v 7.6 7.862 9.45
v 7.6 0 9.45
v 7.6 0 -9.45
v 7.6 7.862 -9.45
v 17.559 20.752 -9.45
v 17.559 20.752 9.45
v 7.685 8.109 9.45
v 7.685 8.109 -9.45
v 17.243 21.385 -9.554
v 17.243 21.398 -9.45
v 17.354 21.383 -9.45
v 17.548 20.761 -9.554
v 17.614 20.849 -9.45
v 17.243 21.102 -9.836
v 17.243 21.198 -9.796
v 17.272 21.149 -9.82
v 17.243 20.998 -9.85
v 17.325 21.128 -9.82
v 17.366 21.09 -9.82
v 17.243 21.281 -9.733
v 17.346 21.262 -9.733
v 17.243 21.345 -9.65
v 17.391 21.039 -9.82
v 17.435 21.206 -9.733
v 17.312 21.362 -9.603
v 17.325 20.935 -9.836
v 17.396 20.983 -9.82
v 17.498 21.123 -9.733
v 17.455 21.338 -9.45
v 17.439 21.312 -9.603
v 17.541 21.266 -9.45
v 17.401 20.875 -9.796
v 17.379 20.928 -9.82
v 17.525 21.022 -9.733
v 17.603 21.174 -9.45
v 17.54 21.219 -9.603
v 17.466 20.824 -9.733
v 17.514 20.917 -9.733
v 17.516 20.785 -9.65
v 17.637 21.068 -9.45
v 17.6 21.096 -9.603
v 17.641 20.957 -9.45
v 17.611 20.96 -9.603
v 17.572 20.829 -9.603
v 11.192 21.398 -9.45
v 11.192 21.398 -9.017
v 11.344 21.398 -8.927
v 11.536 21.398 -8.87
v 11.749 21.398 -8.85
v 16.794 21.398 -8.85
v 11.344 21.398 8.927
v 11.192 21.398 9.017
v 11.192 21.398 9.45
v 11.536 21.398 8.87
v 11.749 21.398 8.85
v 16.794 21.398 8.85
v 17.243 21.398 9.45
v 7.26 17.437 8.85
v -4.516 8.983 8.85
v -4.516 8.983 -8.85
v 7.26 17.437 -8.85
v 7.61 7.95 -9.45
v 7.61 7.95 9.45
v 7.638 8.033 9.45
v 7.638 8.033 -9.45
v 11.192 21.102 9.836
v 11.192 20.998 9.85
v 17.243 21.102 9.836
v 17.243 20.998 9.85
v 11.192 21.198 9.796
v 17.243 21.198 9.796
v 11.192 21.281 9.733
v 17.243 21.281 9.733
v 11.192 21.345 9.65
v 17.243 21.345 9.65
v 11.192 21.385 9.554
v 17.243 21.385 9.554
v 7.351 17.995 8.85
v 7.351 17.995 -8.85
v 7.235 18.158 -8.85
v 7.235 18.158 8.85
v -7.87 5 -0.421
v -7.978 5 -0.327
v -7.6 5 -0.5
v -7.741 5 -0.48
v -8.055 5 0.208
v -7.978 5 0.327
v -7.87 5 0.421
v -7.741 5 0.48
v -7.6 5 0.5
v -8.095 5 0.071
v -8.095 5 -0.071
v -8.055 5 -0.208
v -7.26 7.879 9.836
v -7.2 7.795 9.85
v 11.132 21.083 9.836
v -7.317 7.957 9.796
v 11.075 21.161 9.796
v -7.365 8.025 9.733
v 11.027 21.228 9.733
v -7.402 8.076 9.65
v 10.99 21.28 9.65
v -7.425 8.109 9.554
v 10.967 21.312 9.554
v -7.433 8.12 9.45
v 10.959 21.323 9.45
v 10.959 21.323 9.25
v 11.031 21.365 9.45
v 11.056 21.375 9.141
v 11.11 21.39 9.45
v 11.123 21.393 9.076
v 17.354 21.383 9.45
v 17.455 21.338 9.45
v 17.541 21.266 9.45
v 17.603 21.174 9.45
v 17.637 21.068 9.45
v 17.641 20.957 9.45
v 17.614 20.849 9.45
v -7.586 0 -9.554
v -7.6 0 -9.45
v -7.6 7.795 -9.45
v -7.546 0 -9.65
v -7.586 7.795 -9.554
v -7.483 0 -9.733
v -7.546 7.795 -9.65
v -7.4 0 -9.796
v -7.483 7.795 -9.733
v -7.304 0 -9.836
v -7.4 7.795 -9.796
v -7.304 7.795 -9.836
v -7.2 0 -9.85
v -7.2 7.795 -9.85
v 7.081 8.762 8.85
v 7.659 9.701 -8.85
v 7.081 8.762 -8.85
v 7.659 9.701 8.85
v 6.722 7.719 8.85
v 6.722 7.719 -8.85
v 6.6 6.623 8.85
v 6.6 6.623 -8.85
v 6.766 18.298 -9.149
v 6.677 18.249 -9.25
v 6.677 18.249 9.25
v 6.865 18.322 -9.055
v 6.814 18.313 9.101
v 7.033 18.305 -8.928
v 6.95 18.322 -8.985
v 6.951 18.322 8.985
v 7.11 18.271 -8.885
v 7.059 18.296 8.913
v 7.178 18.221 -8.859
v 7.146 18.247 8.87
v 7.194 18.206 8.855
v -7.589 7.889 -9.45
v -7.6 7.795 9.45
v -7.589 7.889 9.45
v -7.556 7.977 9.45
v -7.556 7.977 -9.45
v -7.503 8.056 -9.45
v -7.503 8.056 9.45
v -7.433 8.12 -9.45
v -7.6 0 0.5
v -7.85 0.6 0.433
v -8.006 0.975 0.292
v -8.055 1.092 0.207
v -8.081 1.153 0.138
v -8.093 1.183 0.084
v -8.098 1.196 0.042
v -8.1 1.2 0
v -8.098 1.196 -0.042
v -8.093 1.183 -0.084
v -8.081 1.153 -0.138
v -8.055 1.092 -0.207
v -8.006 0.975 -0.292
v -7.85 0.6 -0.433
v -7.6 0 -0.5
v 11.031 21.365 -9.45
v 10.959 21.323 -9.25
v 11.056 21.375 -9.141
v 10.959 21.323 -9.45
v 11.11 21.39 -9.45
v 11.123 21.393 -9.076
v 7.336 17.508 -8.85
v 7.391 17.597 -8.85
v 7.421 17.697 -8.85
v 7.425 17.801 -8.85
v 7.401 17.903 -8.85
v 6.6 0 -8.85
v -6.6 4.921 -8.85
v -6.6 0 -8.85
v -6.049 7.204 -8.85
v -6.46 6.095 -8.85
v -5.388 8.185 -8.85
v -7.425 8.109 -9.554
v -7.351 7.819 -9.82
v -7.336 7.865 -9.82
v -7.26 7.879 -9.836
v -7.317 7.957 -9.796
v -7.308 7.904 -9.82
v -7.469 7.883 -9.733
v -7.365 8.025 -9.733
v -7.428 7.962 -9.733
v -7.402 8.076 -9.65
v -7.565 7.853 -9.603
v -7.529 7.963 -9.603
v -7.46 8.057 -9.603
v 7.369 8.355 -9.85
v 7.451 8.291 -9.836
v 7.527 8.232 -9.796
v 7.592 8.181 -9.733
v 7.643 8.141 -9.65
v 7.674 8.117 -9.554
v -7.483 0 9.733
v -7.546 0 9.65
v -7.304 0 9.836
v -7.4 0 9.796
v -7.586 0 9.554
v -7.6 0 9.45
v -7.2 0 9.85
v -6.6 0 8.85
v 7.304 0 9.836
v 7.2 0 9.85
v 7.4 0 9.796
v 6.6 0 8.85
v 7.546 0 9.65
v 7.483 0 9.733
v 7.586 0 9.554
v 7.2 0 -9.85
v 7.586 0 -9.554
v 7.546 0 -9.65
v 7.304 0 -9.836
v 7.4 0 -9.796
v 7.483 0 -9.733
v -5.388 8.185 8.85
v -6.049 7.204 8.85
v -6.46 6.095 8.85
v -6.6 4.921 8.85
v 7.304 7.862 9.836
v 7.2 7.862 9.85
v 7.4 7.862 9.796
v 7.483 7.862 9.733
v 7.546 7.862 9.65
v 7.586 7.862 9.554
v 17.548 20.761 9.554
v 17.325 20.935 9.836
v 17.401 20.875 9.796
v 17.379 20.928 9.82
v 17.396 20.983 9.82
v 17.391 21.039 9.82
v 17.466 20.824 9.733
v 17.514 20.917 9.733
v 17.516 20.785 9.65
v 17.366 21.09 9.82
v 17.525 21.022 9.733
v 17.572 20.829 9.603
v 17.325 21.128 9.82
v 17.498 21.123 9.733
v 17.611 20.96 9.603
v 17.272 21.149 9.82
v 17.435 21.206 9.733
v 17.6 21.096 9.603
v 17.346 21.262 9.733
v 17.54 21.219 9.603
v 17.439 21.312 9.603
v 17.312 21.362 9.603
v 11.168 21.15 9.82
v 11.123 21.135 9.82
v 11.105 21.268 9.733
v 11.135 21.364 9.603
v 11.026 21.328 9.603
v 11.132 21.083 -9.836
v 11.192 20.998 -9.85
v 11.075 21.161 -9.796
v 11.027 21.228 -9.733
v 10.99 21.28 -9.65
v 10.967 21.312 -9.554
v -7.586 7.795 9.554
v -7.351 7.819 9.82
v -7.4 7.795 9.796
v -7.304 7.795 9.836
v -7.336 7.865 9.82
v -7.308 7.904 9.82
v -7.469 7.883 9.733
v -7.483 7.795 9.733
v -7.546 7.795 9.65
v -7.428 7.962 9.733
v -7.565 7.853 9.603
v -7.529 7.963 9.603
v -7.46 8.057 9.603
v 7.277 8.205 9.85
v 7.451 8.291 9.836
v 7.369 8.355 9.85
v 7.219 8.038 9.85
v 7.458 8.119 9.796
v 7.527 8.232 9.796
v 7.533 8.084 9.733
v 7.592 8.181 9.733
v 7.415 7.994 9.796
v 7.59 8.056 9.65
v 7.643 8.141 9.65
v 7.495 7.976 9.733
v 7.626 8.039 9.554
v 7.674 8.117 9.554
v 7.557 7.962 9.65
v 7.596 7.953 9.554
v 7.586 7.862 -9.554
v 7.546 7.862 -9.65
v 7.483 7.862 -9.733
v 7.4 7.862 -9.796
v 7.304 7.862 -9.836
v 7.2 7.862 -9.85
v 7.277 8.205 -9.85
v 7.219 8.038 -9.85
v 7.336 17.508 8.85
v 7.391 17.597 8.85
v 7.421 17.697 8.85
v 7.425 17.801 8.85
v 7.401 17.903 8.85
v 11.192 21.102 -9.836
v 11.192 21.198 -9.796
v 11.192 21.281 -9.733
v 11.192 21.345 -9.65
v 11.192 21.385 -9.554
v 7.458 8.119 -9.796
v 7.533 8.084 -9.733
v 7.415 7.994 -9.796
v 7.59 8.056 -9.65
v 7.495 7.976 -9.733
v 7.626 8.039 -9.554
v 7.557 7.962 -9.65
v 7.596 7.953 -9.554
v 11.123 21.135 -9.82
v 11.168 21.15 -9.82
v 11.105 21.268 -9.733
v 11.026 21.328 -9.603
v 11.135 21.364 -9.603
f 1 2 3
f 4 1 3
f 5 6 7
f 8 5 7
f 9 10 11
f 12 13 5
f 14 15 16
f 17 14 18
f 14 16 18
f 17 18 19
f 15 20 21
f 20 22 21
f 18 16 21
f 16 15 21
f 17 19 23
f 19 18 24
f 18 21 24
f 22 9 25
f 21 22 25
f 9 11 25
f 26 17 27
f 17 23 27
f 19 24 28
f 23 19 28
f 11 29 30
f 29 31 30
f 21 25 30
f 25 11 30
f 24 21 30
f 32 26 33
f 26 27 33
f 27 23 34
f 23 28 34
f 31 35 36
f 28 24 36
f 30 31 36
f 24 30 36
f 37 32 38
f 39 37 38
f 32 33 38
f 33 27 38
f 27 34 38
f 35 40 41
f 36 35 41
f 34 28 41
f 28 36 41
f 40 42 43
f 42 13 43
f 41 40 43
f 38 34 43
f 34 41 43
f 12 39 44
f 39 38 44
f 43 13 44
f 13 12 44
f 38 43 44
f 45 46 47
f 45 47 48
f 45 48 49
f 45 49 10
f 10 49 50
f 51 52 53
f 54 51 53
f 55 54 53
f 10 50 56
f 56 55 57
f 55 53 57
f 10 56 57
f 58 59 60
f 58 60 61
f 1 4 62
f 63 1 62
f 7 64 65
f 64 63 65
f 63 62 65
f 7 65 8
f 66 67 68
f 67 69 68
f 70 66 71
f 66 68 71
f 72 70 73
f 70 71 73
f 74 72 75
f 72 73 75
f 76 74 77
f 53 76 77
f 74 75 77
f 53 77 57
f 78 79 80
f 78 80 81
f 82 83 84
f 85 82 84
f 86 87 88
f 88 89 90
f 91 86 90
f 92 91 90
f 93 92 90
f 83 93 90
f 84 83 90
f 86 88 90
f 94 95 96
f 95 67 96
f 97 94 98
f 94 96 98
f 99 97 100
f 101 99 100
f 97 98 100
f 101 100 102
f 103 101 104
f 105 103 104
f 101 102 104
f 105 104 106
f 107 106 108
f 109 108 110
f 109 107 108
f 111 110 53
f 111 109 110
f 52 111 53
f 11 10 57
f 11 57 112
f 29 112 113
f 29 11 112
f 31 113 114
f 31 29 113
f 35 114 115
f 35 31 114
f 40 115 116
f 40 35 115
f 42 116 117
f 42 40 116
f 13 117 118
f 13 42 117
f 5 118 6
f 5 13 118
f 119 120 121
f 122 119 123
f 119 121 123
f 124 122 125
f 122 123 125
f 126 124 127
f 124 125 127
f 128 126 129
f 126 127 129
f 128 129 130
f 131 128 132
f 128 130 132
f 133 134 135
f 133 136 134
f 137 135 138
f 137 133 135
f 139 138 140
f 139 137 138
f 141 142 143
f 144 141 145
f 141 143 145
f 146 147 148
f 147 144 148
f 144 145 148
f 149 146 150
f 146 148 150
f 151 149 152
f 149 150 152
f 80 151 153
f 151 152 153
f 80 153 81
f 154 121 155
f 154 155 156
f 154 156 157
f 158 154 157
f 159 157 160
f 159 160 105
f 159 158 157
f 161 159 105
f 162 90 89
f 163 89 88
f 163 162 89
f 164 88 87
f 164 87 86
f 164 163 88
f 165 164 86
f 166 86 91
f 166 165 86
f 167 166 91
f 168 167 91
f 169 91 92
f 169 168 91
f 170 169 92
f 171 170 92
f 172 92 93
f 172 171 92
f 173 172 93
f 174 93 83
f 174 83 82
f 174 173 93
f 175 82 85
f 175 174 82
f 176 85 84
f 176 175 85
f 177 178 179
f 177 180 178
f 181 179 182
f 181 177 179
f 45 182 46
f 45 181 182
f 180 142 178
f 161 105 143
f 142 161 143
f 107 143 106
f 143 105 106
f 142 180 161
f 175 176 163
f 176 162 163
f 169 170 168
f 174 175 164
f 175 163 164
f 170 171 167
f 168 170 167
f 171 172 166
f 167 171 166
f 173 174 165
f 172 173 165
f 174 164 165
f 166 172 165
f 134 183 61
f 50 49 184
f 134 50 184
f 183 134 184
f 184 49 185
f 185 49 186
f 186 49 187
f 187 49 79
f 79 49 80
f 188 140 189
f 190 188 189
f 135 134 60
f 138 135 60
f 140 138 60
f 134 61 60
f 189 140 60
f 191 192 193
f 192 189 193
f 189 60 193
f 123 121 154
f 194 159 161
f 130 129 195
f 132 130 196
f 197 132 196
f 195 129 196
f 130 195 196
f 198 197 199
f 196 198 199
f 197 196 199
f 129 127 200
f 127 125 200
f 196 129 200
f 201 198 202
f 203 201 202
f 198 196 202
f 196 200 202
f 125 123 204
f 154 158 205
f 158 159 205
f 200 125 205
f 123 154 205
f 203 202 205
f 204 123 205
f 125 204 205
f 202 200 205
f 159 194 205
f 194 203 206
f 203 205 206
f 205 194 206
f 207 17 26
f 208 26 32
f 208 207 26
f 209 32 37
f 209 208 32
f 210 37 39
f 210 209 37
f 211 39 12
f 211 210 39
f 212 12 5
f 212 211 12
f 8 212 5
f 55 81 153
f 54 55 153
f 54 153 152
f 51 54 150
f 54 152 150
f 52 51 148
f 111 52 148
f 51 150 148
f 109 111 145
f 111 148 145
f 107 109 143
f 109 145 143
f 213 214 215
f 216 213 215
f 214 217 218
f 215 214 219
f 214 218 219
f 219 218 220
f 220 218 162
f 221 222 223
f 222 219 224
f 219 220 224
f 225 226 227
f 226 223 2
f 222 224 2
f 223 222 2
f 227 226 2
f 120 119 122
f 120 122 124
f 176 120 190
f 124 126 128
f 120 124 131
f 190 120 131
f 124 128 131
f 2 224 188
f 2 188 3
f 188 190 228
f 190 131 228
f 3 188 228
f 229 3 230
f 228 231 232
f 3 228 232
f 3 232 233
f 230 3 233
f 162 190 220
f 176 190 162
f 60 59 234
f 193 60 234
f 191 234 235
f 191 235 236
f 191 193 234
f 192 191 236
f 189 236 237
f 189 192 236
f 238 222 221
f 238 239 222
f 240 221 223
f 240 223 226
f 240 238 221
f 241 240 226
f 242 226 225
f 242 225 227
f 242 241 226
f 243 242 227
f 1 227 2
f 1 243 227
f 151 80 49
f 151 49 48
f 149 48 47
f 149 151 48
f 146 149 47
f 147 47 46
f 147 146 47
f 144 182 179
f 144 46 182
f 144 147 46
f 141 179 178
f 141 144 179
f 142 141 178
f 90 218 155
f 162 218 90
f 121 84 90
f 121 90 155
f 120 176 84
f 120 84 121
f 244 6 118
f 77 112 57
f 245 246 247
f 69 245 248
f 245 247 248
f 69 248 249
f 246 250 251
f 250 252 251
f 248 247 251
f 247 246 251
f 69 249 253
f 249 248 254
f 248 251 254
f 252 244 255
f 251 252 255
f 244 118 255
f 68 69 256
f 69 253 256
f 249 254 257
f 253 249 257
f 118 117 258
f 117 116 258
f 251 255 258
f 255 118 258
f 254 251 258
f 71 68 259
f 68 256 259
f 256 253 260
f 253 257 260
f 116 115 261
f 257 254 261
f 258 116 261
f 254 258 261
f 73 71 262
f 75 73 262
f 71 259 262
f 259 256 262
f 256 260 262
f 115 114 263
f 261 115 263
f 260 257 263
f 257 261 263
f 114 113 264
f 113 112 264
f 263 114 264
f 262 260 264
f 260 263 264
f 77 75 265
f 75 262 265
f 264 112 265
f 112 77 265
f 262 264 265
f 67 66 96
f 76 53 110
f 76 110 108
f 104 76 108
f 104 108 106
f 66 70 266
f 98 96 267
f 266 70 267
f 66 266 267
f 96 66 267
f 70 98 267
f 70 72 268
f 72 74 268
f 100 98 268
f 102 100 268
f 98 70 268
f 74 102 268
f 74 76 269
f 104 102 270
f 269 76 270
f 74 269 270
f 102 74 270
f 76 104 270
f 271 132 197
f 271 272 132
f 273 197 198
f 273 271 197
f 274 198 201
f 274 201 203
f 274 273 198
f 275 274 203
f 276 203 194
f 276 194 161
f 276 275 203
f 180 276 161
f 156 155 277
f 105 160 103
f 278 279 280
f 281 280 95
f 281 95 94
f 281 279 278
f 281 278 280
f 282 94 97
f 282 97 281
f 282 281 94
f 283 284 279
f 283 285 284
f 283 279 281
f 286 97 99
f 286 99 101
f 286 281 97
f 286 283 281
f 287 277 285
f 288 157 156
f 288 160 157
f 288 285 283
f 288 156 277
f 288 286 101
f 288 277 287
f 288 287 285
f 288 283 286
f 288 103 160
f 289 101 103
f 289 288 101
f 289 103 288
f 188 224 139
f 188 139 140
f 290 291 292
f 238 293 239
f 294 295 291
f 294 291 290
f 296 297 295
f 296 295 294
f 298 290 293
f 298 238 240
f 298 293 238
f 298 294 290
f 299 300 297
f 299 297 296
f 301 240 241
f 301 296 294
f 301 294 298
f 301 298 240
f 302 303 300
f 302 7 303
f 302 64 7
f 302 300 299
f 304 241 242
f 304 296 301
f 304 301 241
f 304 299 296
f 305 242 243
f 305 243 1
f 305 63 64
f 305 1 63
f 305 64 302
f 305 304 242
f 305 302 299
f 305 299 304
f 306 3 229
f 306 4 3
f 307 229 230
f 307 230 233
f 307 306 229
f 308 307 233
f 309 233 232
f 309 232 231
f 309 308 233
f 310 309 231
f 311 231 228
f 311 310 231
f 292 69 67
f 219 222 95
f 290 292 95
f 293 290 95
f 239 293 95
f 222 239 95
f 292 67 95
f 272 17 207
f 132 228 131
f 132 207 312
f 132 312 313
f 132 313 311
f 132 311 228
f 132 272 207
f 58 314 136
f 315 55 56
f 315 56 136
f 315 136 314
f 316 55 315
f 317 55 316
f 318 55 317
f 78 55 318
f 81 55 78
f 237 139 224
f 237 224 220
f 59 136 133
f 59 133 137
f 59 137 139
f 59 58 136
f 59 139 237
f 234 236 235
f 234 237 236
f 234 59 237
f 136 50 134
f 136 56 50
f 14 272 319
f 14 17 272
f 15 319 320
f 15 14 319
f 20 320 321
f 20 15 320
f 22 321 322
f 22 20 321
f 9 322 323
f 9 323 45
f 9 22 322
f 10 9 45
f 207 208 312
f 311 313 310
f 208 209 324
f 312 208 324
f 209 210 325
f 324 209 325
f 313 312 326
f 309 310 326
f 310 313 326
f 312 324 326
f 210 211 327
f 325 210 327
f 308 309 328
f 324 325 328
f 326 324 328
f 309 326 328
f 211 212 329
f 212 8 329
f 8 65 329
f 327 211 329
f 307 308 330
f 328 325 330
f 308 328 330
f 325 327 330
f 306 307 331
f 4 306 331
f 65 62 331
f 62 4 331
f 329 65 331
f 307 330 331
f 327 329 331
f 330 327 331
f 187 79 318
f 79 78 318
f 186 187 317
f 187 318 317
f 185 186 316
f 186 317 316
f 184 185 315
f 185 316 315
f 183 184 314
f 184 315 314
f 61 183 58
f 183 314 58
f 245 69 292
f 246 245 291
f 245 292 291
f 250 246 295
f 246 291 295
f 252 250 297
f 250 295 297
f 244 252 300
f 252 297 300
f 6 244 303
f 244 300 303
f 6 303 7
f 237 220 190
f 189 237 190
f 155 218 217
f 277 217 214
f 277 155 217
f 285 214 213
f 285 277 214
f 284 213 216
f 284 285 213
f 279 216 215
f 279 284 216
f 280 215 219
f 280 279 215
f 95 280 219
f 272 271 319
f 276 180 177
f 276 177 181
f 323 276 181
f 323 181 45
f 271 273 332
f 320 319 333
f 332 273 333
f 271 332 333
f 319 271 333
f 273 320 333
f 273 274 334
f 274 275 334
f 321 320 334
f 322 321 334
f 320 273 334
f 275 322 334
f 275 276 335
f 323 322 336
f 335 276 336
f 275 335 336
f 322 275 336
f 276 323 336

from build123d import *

# Parameters (mm, degrees)
SKETCH1_W               = 15.2
SKETCH1_H               = 19.7
EXTRUDE1_DEPTH          = 8
BOSS_EXTRUDE1_DEPTH     = 19.7
SHELL1_T                = -1
SKETCH5_R               = 0.5
EXTRUDE4_DEPTH          = 5
EXTRUDE7_DEPTH          = 10.85
EXTRUDE7_DEPTH_BACK     = 10.85
SKETCH14_W              = 17.7
SKETCH14_H              = 1
CUT_EXTRUDE1_DEPTH      = 6.686379255
CUT_EXTRUDE1_DEPTH_BACK = 5
FILLET1_R               = 0.4
FILLET3_R               = 0.4
FILLET4_R               = 5


with BuildPart() as part:
    # Sketch1 → Extrude1 (new body)
    with BuildSketch(Plane(origin=(0, 0, 0), x_dir=(1, 0, 0), z_dir=(0, 1, 0))):
        Rectangle(SKETCH1_W, SKETCH1_H)
    extrude(amount=EXTRUDE1_DEPTH)

    # Sketch11 → Boss-Extrude1 (add)
    with BuildSketch(Plane.XY.offset(9.85)):
        Polygon((-7.6, 8), (11.063283072, 21.398496459), (18.063283072, 21.398496459), (7.6, 8), align=None)
    extrude(amount=-BOSS_EXTRUDE1_DEPTH)

    # Shell1
    shell1_openings = [part.faces().sort_by_distance(p)[0] for p in [
        (14.563283072, 21.398496459, 0),
        (0, 0, 0),
    ]]
    offset(amount=SHELL1_T, openings=shell1_openings, kind=Kind.INTERSECTION)

    # Sketch5 → Extrude4 (add)
    with BuildSketch(Plane.XZ):
        with Locations((-7.6, 0)):
            Circle(SKETCH5_R)
    extrude(amount=-EXTRUDE4_DEPTH)

    # Sketch9 → Extrude7 (cut, two sides)
    with BuildSketch(Plane.XY) as extrude7_sk:
        Polygon((-7.6, 0), (-8.1, 1.2), (-8.1, 0), align=None)
    extrude(amount=EXTRUDE7_DEPTH, mode=Mode.SUBTRACT)
    extrude(extrude7_sk.sketch, amount=-EXTRUDE7_DEPTH_BACK, mode=Mode.SUBTRACT)

    # Sketch14 → Cut-Extrude1 (cut, two sides)
    with BuildSketch(Plane(origin=(17.4380235, 12.51887437, 0), x_dir=(0, 0, 1), z_dir=(0.812339894, 0.583184274, 0))) as cut_extrude1_sk:
        with Locations((0, -10.43091963)):
            Rectangle(SKETCH14_W, SKETCH14_H)
    extrude(amount=CUT_EXTRUDE1_DEPTH, mode=Mode.SUBTRACT)
    extrude(cut_extrude1_sk.sketch, amount=-CUT_EXTRUDE1_DEPTH_BACK, mode=Mode.SUBTRACT)

    # Fillet1
    fillet1_edges = [part.edges().sort_by_distance(p)[0] for p in [
        (7.6, 8, 0),
        (11.063283072, 21.398496459, -9.35),
        (18.063283072, 21.398496459, 0),
        (12.831641536, 14.699248229, 9.85),
        (14.563283072, 21.398496459, 9.85),
        (1.731641536, 14.699248229, 9.85),
        (1.731641536, 14.699248229, -9.85),
        (14.563283072, 21.398496459, -9.85),
        (12.831641536, 14.699248229, -9.85),
        (-7.6, 8, 0),
        (11.063283072, 21.398496459, 9.35),
        (9.032433338, 19.940535774, -8.85),
        (7.001583604, 18.482575089, 0),
        (9.032433338, 19.940535774, 8.85),
        (-7.6, 4, -9.85),
        (7.6, 4, -9.85),
        (7.6, 4, 9.85),
        (-7.6, 4, 9.85),
    ]]
    fillet(fillet1_edges, radius=FILLET1_R)

    # Fillet3
    fillet3_edges = [part.edges().sort_by_distance(p)[0] for p in [
        (7.584767878, 17.670235196, 0),
    ]]
    fillet(fillet3_edges, radius=FILLET3_R)

    # Fillet4
    fillet4_edges = [part.edges().sort_by_distance(p)[0] for p in [
        (-6.6, 7.48689492, 0),
        (6.6, 8.344203967, 0),
    ]]
    fillet(fillet4_edges, radius=FILLET4_R)


solid = part.part
